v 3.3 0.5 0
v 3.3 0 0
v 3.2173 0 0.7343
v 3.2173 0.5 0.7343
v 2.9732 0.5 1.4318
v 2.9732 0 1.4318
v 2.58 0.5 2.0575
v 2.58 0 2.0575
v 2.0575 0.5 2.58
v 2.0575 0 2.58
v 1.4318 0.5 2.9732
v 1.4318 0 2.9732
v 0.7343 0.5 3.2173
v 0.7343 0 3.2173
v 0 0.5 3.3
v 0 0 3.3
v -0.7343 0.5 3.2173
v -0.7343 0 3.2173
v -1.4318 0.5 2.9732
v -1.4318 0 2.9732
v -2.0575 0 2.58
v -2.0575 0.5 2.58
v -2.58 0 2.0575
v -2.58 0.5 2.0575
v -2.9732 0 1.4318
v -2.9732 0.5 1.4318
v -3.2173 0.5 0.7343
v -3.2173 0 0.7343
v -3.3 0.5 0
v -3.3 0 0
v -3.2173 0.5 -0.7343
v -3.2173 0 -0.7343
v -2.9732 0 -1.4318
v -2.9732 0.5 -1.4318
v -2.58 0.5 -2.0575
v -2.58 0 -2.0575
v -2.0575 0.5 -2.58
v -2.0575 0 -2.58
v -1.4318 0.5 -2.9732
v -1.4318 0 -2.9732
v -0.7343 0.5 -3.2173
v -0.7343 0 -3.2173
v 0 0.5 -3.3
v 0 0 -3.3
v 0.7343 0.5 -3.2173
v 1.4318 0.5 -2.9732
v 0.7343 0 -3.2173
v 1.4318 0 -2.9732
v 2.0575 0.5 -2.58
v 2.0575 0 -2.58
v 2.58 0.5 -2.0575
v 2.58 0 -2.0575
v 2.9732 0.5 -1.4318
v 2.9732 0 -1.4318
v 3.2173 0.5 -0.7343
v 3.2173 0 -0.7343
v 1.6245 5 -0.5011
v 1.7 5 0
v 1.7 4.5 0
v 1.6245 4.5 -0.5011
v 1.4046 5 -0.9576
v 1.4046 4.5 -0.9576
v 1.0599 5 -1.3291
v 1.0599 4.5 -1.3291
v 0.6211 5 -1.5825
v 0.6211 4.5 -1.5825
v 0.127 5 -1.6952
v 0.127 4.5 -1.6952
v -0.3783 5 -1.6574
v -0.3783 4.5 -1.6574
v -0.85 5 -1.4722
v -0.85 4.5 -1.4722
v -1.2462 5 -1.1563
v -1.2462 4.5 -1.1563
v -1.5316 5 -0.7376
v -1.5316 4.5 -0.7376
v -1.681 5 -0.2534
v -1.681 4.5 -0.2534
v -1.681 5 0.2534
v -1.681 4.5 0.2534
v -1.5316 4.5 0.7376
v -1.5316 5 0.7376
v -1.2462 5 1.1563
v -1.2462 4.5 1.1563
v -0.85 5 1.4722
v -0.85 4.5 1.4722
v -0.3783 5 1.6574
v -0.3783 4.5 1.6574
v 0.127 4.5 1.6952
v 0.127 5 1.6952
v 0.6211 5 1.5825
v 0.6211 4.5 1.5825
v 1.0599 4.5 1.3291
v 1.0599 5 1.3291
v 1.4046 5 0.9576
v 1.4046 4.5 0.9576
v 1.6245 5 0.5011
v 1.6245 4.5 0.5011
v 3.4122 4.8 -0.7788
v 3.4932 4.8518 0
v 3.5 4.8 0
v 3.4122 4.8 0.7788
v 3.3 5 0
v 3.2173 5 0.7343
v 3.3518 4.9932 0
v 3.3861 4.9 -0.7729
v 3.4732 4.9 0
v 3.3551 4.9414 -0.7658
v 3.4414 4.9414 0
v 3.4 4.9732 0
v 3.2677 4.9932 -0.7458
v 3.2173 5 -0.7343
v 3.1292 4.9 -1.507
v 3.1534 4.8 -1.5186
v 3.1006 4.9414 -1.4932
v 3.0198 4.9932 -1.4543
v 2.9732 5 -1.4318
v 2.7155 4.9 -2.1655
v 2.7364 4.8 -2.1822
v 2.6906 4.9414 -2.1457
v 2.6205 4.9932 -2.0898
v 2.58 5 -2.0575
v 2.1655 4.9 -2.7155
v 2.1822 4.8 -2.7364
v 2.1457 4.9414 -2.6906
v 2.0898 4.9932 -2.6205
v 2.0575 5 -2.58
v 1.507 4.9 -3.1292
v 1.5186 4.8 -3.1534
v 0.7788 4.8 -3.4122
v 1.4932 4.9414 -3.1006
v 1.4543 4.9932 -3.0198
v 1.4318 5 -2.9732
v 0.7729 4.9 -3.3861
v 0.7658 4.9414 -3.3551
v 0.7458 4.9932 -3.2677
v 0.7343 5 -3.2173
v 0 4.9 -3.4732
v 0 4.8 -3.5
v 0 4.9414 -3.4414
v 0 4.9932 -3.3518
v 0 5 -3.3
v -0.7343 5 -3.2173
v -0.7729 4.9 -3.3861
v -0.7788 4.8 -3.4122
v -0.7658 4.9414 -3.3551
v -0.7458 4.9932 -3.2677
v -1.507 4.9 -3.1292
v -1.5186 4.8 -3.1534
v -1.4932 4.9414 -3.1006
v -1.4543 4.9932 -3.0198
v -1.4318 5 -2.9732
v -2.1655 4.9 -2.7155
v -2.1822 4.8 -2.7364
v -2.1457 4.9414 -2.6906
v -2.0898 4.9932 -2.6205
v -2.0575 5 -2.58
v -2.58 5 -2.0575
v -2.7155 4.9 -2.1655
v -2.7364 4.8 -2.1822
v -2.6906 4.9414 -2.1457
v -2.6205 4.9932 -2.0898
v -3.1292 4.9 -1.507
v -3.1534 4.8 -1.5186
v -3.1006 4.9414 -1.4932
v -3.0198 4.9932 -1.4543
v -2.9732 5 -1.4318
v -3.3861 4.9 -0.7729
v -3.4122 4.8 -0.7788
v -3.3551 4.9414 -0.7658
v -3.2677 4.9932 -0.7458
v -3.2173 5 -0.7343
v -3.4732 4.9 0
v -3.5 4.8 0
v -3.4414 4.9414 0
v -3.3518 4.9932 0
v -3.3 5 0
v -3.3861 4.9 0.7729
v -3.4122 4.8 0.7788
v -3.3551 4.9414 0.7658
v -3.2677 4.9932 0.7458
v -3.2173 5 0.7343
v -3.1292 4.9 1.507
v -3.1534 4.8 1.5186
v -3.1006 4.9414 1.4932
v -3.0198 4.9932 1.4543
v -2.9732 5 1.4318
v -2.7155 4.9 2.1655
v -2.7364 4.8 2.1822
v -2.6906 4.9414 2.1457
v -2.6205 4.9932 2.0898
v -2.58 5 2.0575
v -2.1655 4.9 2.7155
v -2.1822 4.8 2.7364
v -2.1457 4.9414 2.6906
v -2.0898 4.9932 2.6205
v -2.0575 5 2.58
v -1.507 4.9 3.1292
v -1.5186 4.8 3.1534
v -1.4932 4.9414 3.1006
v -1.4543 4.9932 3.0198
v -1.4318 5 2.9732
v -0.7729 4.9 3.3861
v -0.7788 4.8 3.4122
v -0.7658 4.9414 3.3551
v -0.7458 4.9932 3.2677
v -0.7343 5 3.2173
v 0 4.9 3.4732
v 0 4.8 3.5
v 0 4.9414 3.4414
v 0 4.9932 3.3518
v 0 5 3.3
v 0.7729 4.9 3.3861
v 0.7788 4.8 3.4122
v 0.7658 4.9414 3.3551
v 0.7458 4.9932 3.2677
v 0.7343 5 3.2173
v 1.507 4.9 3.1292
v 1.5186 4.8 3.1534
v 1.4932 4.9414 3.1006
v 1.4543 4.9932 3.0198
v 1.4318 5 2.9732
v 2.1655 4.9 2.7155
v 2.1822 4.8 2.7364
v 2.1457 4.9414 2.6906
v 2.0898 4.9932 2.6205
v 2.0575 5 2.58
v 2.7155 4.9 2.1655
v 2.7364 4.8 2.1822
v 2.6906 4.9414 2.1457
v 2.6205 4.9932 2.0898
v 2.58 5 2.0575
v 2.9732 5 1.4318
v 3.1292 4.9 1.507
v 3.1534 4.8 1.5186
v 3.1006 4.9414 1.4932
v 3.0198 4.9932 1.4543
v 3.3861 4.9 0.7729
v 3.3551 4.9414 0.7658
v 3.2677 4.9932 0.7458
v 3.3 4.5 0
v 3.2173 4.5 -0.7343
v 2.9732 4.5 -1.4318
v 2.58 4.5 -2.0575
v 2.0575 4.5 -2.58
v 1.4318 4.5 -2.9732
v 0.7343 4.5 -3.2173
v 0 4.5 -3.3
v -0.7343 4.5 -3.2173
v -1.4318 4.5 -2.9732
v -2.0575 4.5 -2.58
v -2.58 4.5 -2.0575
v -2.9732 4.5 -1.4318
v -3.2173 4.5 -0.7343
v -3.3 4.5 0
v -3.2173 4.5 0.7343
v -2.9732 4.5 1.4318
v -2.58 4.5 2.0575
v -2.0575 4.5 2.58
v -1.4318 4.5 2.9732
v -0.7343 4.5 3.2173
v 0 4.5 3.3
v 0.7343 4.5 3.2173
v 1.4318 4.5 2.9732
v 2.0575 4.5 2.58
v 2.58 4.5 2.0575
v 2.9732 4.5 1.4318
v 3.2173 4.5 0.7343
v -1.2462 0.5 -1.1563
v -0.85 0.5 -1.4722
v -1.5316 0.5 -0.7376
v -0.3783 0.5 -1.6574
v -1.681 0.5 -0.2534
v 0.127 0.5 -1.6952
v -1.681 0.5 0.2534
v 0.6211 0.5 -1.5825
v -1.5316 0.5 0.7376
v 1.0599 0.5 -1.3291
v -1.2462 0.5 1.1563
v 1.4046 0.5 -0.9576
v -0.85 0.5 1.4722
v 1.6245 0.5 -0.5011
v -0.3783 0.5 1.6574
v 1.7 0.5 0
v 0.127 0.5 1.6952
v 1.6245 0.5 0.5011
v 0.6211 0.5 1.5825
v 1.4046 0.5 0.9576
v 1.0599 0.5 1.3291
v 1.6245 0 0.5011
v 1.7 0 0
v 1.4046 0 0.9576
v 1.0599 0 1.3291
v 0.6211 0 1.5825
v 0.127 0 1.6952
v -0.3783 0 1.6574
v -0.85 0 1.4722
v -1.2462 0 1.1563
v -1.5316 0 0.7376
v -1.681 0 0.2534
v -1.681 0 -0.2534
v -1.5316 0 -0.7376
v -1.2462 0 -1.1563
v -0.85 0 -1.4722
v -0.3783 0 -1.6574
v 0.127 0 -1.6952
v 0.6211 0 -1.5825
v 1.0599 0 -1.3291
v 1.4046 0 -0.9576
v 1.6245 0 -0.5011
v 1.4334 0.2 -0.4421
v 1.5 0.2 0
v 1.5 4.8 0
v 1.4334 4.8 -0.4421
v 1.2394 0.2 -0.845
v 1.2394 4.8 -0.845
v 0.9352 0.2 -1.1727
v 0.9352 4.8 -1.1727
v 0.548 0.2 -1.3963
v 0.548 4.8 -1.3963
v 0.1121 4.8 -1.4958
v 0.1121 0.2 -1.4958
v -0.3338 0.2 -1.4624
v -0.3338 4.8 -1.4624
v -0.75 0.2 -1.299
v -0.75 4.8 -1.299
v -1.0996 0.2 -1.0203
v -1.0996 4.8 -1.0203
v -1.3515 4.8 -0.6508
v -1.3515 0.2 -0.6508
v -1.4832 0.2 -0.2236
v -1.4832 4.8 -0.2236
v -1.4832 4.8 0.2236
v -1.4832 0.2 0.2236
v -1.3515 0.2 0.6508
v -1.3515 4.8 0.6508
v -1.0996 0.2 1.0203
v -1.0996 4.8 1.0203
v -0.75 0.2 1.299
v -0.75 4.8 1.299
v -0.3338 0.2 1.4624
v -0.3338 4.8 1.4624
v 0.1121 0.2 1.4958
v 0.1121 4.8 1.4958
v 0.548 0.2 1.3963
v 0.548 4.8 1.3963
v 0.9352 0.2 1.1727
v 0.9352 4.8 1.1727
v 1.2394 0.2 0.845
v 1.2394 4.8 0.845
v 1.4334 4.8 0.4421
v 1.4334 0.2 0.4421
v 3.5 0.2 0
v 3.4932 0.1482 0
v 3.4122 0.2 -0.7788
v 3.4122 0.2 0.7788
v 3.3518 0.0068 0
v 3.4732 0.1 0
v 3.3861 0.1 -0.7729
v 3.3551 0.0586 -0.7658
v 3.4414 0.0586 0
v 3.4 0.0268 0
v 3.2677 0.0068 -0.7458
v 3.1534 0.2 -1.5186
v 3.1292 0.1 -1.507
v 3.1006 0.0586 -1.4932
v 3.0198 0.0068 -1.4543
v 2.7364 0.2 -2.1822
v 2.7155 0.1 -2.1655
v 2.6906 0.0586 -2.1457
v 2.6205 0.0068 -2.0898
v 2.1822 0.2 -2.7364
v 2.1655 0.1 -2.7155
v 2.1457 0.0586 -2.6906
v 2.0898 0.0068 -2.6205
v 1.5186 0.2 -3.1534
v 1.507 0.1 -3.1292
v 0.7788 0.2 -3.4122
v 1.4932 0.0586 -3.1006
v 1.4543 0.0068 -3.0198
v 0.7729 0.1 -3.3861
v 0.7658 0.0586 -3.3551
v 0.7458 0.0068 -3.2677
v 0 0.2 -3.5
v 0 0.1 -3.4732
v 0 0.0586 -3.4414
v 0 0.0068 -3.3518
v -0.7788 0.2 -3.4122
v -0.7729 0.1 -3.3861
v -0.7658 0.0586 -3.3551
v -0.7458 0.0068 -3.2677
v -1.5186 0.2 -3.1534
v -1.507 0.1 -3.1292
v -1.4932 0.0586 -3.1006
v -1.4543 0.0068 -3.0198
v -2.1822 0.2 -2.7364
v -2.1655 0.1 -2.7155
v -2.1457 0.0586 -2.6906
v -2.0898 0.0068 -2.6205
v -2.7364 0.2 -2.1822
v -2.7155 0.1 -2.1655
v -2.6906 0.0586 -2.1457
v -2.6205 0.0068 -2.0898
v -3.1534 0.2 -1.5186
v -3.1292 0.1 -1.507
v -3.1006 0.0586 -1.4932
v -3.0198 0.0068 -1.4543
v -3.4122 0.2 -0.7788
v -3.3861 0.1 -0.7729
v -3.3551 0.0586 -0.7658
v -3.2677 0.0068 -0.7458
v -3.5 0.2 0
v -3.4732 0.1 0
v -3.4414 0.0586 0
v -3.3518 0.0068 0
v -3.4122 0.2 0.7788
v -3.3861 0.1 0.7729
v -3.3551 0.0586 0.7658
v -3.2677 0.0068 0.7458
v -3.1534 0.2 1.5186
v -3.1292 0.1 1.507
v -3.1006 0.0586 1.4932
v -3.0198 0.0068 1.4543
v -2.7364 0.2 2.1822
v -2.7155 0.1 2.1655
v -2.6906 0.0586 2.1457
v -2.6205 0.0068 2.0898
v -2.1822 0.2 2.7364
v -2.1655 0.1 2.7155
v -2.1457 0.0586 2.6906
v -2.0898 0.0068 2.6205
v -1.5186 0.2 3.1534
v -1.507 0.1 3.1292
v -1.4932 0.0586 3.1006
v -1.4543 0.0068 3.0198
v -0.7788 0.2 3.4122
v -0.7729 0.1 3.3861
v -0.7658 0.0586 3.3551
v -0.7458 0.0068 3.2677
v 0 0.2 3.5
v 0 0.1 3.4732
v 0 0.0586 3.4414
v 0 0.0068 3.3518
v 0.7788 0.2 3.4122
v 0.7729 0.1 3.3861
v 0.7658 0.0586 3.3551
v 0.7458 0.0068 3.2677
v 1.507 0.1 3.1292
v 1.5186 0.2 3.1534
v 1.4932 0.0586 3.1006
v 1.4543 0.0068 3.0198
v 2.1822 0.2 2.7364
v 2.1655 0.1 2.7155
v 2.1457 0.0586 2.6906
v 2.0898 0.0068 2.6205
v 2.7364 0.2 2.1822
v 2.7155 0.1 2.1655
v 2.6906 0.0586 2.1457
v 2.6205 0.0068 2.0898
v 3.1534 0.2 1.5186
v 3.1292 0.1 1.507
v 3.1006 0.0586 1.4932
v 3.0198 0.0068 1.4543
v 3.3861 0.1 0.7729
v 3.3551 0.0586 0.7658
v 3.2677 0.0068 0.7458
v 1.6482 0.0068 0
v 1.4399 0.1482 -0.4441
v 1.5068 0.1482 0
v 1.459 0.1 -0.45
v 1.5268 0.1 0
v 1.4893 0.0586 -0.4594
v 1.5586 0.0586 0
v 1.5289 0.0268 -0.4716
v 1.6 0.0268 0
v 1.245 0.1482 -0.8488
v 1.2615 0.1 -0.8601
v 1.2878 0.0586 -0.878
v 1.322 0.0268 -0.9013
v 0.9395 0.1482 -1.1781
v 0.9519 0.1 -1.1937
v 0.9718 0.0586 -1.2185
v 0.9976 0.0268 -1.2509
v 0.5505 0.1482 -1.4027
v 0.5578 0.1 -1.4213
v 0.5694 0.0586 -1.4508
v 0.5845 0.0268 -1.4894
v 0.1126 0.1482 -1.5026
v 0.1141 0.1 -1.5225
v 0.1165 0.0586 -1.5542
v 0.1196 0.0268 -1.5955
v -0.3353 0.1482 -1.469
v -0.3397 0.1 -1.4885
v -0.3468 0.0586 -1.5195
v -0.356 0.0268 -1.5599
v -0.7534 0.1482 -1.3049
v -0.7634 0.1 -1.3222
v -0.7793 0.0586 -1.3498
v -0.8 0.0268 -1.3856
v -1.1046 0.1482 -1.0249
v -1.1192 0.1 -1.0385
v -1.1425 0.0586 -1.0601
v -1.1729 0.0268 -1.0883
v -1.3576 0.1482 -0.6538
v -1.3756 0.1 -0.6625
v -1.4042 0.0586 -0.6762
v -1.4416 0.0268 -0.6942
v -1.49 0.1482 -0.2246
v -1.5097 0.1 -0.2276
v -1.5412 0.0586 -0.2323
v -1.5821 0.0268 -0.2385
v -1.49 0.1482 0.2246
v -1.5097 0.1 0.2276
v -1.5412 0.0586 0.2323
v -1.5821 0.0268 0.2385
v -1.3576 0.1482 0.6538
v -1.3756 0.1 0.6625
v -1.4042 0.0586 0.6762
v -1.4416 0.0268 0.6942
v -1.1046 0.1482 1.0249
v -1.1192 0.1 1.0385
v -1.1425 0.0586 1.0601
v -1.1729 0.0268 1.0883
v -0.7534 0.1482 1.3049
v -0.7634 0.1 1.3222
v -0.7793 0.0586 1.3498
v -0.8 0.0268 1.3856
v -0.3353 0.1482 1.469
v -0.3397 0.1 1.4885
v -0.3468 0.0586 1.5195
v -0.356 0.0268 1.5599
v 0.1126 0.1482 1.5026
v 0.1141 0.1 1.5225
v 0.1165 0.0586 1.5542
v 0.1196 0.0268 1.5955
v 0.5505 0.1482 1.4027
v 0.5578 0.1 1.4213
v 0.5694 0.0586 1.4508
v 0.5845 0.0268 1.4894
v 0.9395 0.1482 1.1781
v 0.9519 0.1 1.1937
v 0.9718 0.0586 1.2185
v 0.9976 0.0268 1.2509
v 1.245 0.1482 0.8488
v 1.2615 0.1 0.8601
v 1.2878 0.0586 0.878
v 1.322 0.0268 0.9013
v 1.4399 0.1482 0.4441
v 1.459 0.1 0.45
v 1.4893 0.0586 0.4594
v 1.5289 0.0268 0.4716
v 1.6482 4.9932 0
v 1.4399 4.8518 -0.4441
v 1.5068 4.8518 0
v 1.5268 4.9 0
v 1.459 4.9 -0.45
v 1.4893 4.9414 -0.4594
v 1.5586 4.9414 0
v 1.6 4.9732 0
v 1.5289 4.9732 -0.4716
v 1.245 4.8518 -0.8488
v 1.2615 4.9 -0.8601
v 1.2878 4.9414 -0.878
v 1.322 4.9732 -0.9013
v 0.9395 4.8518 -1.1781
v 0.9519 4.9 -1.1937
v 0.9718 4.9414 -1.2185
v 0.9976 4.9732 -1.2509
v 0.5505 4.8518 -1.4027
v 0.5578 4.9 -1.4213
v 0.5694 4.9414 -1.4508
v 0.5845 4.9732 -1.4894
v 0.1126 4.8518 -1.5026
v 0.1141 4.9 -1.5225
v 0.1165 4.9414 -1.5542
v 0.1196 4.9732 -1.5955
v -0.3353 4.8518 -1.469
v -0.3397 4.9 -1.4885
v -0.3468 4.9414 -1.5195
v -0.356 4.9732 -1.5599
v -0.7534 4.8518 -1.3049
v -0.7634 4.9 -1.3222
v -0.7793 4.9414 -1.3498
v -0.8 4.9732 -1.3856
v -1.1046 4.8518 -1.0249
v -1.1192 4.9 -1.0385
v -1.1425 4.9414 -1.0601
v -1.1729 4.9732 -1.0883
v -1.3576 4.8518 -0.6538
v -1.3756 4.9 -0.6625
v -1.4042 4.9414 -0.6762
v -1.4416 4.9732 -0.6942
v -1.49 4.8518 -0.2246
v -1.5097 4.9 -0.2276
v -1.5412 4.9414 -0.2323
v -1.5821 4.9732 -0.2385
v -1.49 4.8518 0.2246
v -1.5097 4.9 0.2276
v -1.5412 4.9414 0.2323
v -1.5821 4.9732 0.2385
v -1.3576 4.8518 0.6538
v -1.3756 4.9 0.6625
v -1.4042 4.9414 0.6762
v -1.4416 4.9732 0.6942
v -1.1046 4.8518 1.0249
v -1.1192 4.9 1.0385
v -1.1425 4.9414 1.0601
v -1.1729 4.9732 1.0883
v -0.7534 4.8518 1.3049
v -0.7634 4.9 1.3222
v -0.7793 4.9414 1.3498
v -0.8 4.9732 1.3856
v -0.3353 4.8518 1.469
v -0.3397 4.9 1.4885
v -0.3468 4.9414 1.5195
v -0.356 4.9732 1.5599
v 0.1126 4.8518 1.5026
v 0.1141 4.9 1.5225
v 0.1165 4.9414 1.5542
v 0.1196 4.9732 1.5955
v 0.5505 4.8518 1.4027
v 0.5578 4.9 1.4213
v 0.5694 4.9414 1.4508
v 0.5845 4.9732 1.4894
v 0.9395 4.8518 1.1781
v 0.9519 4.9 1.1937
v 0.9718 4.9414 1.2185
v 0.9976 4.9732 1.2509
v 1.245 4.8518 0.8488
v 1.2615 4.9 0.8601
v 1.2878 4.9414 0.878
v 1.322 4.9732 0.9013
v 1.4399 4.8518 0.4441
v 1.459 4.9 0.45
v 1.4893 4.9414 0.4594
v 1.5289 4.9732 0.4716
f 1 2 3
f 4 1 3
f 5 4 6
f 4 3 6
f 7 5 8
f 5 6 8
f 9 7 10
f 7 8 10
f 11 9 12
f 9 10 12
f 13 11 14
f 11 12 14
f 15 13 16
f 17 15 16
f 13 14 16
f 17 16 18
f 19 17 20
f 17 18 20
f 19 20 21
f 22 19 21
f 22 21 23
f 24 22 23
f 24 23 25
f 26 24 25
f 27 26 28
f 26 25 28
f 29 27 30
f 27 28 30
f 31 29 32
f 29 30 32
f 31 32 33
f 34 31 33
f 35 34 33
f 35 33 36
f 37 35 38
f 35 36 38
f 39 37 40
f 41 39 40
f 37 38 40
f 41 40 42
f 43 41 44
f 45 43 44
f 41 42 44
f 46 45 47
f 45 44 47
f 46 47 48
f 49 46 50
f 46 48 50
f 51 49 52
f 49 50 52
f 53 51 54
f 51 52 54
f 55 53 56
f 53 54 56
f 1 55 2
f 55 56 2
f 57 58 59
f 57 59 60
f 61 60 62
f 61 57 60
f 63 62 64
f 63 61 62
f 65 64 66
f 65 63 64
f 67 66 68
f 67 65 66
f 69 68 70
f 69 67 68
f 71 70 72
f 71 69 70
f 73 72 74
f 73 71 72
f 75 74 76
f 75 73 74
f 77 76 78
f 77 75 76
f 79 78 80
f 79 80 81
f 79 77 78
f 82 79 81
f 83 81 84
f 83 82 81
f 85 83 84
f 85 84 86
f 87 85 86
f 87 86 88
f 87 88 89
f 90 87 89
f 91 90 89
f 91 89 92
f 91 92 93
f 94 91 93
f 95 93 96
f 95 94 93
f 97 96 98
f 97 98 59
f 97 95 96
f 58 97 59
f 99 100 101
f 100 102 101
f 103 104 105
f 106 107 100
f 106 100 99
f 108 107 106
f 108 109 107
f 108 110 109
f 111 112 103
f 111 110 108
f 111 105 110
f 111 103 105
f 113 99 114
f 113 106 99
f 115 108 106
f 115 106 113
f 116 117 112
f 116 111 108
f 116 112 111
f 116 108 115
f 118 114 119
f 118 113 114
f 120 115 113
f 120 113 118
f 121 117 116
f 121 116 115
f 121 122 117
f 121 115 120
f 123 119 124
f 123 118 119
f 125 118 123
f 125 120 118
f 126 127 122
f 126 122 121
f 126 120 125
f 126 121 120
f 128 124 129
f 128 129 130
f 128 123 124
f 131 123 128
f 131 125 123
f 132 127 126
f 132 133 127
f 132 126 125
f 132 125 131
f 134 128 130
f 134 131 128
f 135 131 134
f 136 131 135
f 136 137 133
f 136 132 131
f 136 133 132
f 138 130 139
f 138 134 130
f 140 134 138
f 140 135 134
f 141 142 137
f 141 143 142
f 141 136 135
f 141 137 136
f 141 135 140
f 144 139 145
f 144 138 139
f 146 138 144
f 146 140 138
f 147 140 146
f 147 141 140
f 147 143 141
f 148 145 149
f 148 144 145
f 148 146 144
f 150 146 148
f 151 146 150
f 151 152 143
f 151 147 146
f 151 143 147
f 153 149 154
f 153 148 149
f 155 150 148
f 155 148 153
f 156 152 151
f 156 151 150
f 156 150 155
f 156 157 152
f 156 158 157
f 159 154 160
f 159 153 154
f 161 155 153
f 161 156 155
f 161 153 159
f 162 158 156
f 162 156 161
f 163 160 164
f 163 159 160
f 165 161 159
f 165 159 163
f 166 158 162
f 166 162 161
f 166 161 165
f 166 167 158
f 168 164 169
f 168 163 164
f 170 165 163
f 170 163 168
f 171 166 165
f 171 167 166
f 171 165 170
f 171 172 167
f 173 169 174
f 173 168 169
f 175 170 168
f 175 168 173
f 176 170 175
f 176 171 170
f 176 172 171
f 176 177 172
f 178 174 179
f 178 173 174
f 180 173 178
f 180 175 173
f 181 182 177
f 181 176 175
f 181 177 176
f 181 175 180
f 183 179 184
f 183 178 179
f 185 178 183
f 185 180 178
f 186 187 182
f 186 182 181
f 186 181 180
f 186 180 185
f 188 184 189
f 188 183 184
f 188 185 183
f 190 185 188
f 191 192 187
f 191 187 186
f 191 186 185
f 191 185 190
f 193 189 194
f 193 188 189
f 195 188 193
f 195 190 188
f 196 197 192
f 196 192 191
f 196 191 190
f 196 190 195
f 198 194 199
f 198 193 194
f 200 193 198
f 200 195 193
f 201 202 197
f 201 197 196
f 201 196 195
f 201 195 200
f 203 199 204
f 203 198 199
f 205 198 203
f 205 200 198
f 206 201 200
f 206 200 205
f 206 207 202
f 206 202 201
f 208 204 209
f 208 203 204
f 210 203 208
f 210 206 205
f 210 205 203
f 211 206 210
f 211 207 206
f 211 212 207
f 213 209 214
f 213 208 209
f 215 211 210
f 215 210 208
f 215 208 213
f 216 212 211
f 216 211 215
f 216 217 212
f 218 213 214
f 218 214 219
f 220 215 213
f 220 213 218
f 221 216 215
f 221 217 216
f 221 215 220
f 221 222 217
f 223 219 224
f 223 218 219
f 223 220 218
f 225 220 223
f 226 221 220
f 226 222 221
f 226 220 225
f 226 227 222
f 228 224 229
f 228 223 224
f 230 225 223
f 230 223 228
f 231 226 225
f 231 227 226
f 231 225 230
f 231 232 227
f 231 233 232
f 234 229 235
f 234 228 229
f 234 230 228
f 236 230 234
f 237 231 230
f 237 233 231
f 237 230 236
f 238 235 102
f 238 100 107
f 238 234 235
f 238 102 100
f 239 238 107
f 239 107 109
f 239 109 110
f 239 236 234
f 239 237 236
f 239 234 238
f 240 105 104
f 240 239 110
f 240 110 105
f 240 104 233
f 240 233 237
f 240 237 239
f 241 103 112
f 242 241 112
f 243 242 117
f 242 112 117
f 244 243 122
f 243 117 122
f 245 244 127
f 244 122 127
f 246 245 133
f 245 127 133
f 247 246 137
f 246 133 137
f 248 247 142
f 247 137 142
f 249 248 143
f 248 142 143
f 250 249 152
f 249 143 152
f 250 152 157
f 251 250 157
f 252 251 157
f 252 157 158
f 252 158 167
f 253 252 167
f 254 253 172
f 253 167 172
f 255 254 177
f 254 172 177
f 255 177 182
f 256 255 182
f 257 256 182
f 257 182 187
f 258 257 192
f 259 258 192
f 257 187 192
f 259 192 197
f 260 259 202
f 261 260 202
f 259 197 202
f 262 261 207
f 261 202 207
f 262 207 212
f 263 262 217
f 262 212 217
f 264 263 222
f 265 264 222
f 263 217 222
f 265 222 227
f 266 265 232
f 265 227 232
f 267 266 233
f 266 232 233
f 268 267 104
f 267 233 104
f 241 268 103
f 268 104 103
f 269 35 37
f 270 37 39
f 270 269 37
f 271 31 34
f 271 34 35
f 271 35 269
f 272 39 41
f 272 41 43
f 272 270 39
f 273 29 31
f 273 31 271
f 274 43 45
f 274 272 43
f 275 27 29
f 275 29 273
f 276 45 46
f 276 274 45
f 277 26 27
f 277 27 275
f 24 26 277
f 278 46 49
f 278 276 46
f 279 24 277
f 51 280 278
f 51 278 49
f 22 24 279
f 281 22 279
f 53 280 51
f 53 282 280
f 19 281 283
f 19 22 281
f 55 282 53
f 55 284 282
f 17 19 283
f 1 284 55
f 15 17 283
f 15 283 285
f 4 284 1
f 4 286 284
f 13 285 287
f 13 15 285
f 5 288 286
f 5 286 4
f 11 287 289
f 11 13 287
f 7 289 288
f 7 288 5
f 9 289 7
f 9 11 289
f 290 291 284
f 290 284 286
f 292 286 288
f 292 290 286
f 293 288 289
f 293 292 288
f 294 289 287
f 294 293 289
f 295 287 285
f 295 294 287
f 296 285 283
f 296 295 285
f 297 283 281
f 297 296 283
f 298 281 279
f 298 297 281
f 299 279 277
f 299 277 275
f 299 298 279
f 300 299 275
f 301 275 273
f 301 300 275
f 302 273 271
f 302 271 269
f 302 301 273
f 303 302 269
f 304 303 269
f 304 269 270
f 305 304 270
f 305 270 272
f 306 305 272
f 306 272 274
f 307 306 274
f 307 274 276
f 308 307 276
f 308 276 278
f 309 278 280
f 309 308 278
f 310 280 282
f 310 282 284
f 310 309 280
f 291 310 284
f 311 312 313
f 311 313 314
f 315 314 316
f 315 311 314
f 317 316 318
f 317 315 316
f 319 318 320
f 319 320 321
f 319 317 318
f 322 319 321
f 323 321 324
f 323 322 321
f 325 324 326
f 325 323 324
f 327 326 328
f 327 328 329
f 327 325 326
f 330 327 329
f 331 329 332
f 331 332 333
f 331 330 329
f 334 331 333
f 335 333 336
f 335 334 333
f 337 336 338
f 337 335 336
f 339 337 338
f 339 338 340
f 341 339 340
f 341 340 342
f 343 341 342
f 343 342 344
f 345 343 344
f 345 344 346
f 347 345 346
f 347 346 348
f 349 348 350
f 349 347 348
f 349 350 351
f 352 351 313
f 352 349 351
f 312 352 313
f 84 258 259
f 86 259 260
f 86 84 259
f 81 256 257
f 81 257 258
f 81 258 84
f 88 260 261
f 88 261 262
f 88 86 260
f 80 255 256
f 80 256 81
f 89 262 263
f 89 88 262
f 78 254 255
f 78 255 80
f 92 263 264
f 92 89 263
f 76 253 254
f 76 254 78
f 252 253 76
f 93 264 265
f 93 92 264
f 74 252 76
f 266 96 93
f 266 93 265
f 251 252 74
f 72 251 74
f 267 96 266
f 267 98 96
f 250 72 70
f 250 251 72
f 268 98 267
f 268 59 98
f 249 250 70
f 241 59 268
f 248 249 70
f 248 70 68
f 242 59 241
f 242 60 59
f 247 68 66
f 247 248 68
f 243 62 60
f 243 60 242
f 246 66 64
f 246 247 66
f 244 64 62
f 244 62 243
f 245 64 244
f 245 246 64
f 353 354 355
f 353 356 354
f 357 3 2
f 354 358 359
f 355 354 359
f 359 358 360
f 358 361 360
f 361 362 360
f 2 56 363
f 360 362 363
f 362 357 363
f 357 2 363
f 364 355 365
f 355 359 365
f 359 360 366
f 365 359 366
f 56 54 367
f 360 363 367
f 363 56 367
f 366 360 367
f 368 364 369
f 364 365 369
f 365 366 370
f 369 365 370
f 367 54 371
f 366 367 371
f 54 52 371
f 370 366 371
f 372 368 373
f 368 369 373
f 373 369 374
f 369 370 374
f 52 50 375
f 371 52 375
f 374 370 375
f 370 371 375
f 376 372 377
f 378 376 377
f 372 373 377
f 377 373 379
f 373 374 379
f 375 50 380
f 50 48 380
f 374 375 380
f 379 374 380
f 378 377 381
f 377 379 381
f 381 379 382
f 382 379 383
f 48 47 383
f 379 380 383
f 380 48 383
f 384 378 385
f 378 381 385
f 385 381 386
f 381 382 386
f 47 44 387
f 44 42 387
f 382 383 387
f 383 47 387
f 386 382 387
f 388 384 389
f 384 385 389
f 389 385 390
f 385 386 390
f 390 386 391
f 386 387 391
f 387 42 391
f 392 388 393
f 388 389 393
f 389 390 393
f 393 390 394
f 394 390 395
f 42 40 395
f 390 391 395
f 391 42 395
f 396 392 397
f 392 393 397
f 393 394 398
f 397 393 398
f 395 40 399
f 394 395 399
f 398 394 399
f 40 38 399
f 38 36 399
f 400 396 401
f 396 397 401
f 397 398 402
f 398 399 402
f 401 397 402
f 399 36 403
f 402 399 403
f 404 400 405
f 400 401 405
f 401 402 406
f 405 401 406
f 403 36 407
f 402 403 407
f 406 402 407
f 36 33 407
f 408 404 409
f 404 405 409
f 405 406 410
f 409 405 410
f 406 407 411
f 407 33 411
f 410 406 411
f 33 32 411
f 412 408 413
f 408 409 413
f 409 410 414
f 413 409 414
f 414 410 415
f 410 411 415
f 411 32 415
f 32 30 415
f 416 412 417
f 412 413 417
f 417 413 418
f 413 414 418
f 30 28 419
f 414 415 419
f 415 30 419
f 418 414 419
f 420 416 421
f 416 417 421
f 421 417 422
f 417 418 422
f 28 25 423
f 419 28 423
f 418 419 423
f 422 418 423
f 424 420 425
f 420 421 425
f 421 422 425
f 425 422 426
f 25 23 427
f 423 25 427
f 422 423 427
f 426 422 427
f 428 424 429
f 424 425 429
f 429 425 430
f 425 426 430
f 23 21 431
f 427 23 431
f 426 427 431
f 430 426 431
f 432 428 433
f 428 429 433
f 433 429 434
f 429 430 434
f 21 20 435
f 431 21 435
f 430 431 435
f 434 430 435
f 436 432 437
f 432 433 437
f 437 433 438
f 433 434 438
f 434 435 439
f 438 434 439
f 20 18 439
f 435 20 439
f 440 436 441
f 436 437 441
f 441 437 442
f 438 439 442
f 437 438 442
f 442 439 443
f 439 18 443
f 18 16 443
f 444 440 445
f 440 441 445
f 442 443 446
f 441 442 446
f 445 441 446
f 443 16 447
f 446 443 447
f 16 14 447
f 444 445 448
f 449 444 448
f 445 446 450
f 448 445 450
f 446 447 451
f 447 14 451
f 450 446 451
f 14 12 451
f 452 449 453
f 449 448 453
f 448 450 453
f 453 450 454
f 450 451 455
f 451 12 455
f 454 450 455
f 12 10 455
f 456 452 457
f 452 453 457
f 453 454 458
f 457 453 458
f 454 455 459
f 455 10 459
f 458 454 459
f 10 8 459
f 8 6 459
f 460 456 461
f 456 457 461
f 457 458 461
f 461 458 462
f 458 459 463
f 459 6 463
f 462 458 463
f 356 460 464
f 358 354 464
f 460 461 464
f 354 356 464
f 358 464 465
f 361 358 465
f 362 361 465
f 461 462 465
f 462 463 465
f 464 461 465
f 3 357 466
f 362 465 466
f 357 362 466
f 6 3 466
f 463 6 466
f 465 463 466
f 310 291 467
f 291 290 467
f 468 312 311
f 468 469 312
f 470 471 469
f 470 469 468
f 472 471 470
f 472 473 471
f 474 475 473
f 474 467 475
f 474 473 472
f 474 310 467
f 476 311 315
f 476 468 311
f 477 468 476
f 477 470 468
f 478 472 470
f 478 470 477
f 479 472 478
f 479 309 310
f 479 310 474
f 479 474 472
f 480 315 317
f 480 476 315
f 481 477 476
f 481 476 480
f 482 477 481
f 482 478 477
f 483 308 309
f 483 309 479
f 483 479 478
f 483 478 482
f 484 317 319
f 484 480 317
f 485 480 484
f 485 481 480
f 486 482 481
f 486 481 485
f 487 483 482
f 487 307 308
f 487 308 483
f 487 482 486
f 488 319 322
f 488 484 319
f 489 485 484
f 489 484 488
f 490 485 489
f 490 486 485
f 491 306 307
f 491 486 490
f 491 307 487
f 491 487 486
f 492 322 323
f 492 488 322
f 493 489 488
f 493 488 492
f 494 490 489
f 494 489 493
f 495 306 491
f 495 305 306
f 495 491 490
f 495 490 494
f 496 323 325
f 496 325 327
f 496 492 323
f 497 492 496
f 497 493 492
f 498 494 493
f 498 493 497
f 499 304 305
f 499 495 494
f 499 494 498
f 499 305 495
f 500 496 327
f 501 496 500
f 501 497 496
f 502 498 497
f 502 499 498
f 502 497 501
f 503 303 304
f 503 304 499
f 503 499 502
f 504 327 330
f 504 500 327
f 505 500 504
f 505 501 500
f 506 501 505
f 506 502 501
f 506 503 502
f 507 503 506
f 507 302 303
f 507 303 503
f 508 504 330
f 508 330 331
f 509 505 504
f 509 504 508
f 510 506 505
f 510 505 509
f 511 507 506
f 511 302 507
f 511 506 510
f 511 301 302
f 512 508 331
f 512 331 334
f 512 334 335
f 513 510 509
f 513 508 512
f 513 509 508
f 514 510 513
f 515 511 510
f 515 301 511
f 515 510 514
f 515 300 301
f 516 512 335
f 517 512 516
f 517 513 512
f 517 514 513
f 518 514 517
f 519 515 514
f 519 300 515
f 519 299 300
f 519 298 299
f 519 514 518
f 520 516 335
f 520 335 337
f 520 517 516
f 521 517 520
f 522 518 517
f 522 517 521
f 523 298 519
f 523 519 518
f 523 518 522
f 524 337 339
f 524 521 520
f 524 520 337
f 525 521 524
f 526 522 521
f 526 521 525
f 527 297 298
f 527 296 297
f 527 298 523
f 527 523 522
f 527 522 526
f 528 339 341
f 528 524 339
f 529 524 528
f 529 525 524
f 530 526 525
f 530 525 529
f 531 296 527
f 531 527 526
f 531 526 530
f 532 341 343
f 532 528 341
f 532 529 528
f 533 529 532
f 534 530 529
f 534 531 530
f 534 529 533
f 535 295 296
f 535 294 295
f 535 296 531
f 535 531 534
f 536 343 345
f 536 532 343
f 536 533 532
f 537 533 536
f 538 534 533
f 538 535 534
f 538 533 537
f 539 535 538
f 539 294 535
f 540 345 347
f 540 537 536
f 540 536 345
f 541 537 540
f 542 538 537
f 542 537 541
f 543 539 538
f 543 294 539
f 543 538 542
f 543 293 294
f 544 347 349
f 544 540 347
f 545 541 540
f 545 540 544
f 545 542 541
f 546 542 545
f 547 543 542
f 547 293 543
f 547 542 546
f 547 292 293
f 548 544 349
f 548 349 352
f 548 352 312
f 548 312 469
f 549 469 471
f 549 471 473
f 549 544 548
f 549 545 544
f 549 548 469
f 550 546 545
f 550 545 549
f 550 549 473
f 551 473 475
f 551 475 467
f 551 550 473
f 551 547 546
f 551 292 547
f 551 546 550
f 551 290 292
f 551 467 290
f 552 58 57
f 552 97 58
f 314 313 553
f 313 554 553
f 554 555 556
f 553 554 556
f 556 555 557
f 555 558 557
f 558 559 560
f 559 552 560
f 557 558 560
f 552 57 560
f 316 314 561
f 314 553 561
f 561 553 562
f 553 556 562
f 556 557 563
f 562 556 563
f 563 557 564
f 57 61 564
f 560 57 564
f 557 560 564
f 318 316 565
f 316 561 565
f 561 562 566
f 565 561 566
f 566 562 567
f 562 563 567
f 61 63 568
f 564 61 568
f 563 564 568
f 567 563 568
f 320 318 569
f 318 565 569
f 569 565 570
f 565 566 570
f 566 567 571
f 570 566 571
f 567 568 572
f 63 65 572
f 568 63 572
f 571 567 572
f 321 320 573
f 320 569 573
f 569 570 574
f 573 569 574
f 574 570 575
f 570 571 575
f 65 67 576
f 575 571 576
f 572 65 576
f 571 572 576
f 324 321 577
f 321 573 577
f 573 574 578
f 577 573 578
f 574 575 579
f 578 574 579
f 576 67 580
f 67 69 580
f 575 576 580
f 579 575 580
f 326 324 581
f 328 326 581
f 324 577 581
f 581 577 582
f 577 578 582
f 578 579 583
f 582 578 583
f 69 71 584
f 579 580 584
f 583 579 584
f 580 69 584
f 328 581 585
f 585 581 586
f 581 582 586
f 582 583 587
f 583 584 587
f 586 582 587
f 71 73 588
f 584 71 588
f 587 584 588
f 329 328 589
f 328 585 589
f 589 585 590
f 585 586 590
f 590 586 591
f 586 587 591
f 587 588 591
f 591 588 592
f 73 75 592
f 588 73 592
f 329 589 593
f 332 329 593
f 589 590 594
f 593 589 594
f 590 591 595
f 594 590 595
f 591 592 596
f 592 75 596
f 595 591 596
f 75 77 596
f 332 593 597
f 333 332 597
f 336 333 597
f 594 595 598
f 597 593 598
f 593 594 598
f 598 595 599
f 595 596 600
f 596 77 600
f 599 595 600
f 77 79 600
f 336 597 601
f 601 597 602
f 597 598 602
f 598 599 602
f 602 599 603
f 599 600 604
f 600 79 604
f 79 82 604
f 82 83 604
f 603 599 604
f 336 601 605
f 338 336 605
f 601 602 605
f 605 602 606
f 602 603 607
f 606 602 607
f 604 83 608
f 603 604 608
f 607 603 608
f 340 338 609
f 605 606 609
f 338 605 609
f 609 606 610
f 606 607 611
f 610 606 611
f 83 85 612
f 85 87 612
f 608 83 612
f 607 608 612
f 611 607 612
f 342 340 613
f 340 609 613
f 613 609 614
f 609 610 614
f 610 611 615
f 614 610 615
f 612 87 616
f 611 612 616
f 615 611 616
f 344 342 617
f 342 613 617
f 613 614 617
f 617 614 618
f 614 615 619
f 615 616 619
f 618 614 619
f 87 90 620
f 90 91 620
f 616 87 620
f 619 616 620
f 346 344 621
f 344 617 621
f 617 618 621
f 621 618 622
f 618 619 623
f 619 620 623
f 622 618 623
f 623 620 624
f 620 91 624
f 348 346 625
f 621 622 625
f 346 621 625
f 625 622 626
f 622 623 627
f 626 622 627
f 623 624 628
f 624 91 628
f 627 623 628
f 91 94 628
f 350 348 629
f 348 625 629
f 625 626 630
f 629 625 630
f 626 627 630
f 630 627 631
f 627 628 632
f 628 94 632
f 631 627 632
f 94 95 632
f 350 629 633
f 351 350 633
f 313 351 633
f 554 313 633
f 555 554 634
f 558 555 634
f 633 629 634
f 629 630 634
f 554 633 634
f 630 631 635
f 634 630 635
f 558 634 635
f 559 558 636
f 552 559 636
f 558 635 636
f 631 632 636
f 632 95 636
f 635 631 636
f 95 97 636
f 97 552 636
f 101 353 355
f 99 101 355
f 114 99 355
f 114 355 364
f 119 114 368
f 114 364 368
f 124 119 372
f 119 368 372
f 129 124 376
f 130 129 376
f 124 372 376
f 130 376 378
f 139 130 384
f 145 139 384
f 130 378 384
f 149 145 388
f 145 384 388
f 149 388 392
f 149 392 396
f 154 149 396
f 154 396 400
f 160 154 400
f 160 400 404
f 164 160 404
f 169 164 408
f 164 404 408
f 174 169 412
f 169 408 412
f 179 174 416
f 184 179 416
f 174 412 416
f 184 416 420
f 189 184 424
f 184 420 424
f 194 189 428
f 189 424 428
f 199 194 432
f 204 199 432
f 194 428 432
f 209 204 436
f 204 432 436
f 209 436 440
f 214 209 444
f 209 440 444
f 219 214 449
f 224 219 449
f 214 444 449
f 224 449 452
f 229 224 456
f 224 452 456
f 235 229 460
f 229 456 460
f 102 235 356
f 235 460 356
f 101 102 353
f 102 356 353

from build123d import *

# Parameters (mm, degrees)
ESQUISSE1_R             = 3.5
ESQUISSE1_R_2           = 1.5
BOSS_EXTRU_1_DEPTH      = 5
CONG_1_R                = 0.2
ESQUISSE3_R             = 3.3
ESQUISSE3_R_2           = 1.7
ENL_V_MAT_EXTRU_1_DEPTH = 0.5
ESQUISSE4_R             = 3.3
ESQUISSE4_R_2           = 1.7
ENL_V_MAT_EXTRU_2_DEPTH = 0.5


with BuildPart() as part:
    # Esquisse1 → Boss.-Extru.1 (new body)
    with BuildSketch(Plane(origin=(0, 0, 0), x_dir=(1, 0, 0), z_dir=(0, 1, 0))):
        Circle(ESQUISSE1_R)
        Circle(ESQUISSE1_R_2, mode=Mode.SUBTRACT)
    extrude(amount=BOSS_EXTRU_1_DEPTH)

    # Congé1
    cong_1_edges = [part.edges().sort_by_distance(p)[0] for p in [
        (-3.5, 0, 0),
        (-3.5, 5, 0),
        (-1.5, 0, 0),
        (-1.5, 5, 0),
    ]]
    fillet(cong_1_edges, radius=CONG_1_R)

    # Esquisse3 → Enlèv. mat.-Extru.1 (cut)
    with BuildSketch(Plane(origin=(0, 5, 0), x_dir=(1, 0, 0), z_dir=(0, 1, 0))):
        Circle(ESQUISSE3_R)
        Circle(ESQUISSE3_R_2, mode=Mode.SUBTRACT)
    extrude(amount=-ENL_V_MAT_EXTRU_1_DEPTH, mode=Mode.SUBTRACT)

    # Esquisse4 → Enlèv. mat.-Extru.2 (cut)
    with BuildSketch(Plane.XZ):
        Circle(ESQUISSE4_R)
        Circle(ESQUISSE4_R_2, mode=Mode.SUBTRACT)
    extrude(amount=-ENL_V_MAT_EXTRU_2_DEPTH, mode=Mode.SUBTRACT)


solid = part.part
